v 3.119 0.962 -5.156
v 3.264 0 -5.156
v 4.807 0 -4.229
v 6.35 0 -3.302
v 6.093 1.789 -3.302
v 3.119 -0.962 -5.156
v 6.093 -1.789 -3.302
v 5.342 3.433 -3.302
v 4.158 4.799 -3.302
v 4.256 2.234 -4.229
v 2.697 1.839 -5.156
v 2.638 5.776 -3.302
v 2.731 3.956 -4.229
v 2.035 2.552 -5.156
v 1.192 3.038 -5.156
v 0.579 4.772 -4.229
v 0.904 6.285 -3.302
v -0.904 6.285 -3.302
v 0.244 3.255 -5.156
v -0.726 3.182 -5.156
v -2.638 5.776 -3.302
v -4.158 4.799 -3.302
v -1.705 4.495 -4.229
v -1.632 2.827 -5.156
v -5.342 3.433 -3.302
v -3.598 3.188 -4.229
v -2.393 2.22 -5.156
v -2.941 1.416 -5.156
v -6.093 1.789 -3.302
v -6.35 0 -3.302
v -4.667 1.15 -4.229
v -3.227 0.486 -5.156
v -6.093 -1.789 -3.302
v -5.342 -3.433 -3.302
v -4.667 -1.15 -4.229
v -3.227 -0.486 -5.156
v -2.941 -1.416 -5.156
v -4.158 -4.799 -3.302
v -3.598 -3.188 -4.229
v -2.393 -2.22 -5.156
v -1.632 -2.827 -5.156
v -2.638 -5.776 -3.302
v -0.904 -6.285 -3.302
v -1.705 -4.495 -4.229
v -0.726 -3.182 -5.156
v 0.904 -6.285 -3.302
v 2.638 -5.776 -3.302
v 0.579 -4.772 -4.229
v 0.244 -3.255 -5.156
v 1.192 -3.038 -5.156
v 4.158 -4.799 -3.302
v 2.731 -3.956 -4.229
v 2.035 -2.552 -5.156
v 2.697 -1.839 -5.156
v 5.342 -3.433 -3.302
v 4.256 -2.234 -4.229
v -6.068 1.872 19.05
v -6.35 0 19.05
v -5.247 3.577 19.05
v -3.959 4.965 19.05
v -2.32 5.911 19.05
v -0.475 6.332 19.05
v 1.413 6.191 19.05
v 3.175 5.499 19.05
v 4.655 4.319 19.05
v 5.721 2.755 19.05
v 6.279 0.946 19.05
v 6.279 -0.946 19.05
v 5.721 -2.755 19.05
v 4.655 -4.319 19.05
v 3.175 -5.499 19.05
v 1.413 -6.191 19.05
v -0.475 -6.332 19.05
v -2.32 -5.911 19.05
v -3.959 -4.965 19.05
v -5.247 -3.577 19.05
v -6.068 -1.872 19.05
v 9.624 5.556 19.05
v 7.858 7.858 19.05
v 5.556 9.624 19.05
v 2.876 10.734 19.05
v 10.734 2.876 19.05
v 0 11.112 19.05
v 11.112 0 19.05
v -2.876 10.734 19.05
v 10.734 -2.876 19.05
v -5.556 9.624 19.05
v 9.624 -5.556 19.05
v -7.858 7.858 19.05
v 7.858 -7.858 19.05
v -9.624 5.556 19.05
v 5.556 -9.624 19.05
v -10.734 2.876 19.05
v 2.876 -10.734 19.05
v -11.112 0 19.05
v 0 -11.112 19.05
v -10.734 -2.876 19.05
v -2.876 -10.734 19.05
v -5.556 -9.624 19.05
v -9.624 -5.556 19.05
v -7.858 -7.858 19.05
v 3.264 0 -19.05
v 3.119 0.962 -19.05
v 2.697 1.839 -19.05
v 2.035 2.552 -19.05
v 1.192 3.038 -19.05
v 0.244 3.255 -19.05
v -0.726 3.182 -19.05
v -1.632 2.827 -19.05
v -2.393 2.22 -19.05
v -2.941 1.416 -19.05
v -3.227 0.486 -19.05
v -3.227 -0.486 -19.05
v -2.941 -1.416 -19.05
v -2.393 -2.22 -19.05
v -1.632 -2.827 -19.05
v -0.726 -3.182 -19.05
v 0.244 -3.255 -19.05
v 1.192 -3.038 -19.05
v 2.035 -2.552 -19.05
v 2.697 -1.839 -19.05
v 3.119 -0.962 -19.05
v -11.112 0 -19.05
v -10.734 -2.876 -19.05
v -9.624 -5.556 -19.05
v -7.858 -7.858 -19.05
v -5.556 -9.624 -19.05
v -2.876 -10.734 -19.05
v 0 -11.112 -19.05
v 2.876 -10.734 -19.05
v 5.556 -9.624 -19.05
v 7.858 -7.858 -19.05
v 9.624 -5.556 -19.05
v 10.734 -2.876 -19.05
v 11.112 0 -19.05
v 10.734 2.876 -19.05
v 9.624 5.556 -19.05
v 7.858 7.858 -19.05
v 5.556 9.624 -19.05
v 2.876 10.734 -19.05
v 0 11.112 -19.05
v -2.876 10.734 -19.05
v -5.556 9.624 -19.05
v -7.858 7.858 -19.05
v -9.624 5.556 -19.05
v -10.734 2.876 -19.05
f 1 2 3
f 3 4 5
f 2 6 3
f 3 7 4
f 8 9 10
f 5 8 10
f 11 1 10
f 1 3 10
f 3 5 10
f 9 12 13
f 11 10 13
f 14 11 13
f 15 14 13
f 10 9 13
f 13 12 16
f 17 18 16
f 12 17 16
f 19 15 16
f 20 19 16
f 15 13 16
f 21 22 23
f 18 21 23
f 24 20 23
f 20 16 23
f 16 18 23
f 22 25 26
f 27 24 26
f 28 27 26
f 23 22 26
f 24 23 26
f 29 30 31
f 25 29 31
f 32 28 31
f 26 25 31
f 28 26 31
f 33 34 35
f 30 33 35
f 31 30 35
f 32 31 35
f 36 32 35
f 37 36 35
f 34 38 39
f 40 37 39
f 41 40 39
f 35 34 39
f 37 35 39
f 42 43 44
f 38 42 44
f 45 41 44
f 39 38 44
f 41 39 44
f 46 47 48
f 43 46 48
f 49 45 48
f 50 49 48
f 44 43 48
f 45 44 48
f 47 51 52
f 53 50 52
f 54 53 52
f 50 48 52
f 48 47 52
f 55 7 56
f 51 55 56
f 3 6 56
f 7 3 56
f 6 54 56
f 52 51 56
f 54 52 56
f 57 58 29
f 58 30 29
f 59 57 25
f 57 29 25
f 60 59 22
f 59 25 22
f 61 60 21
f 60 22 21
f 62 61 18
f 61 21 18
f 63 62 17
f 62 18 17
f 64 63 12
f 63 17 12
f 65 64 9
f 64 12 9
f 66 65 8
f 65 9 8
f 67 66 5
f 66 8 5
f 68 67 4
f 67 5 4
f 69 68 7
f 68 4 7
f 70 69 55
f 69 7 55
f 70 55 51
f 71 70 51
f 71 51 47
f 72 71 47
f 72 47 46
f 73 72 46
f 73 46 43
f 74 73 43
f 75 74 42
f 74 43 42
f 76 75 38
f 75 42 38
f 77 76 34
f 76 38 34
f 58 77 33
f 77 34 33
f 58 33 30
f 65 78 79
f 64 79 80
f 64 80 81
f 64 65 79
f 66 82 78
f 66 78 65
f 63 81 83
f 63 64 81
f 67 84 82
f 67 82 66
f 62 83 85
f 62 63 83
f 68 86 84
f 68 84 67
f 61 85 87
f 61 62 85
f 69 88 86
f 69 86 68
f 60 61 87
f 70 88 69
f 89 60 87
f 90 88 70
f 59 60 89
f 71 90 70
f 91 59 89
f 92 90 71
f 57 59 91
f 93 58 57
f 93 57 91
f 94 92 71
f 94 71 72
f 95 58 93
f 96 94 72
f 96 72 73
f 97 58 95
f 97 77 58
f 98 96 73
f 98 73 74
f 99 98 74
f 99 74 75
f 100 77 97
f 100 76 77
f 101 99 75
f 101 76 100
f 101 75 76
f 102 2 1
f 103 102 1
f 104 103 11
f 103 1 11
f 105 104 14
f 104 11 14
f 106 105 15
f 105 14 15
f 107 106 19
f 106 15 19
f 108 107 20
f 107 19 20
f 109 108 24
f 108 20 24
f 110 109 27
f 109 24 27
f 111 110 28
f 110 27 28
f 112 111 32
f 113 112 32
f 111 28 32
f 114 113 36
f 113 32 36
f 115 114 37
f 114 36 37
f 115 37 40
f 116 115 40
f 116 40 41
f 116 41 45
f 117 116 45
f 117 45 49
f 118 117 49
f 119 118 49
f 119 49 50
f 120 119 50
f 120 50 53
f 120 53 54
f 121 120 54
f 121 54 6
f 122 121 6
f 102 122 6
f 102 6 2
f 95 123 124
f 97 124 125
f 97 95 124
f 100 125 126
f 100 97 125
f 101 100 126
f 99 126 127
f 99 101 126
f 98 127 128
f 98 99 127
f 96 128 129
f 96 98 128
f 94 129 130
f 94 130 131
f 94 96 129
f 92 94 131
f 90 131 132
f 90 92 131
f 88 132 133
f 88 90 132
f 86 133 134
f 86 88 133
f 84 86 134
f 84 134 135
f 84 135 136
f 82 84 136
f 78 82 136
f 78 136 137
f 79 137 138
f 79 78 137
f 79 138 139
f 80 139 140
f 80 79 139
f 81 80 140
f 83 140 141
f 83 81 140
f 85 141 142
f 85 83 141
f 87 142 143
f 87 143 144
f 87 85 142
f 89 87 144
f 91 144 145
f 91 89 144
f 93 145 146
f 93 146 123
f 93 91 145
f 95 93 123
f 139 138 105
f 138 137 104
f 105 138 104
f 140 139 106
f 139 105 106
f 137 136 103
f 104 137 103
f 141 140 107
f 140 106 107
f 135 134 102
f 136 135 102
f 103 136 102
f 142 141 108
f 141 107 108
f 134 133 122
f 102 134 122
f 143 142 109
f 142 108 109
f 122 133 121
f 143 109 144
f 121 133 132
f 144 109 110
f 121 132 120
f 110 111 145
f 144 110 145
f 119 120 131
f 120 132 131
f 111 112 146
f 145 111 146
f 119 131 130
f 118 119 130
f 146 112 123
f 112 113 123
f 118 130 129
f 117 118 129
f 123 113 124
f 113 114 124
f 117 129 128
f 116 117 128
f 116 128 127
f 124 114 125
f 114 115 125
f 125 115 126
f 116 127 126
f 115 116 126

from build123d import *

# Parameters (mm, degrees)
SKETCH1_R                      = 11.1125
BOSS_EXTRUDE1_DEPTH            = 19.05
F_1_2_0_5_DIAMETER_HOLE1_D     = 12.7
F_1_2_0_5_DIAMETER_HOLE1_DEPTH = 22.352
F_1_2_0_5_DIAMETER_HOLE1_TIP   = 3.815464931
SKETCH10_R                     = 3.2639
CUT_EXTRUDE3_DEPTH             = 42.21389708


with BuildPart() as part:
    # Sketch1 → Boss-Extrude1 (new, symmetric)
    with BuildSketch(Plane.XY):
        with Locations(Location((0, 0, 0), (0, 0, 180))):
            Circle(SKETCH1_R)
    extrude(amount=BOSS_EXTRUDE1_DEPTH, both=True)

    # 1/2 (0.5) Diameter Hole1
    with Locations(Plane.XY.offset(19.05)):
        with Locations((0, 0)):
            Hole(F_1_2_0_5_DIAMETER_HOLE1_D / 2, depth=F_1_2_0_5_DIAMETER_HOLE1_DEPTH)
            with Locations((0, 0, -(F_1_2_0_5_DIAMETER_HOLE1_DEPTH + F_1_2_0_5_DIAMETER_HOLE1_TIP / 2))):  # 118° drill point
                Cone(0, F_1_2_0_5_DIAMETER_HOLE1_D / 2, F_1_2_0_5_DIAMETER_HOLE1_TIP, mode=Mode.SUBTRACT)

    # Sketch10 → Cut-Extrude3 (cut, through all)
    with BuildSketch(Plane.XY.offset(19.05)):
        Circle(SKETCH10_R)
    extrude(amount=-CUT_EXTRUDE3_DEPTH, mode=Mode.SUBTRACT)


solid = part.part
